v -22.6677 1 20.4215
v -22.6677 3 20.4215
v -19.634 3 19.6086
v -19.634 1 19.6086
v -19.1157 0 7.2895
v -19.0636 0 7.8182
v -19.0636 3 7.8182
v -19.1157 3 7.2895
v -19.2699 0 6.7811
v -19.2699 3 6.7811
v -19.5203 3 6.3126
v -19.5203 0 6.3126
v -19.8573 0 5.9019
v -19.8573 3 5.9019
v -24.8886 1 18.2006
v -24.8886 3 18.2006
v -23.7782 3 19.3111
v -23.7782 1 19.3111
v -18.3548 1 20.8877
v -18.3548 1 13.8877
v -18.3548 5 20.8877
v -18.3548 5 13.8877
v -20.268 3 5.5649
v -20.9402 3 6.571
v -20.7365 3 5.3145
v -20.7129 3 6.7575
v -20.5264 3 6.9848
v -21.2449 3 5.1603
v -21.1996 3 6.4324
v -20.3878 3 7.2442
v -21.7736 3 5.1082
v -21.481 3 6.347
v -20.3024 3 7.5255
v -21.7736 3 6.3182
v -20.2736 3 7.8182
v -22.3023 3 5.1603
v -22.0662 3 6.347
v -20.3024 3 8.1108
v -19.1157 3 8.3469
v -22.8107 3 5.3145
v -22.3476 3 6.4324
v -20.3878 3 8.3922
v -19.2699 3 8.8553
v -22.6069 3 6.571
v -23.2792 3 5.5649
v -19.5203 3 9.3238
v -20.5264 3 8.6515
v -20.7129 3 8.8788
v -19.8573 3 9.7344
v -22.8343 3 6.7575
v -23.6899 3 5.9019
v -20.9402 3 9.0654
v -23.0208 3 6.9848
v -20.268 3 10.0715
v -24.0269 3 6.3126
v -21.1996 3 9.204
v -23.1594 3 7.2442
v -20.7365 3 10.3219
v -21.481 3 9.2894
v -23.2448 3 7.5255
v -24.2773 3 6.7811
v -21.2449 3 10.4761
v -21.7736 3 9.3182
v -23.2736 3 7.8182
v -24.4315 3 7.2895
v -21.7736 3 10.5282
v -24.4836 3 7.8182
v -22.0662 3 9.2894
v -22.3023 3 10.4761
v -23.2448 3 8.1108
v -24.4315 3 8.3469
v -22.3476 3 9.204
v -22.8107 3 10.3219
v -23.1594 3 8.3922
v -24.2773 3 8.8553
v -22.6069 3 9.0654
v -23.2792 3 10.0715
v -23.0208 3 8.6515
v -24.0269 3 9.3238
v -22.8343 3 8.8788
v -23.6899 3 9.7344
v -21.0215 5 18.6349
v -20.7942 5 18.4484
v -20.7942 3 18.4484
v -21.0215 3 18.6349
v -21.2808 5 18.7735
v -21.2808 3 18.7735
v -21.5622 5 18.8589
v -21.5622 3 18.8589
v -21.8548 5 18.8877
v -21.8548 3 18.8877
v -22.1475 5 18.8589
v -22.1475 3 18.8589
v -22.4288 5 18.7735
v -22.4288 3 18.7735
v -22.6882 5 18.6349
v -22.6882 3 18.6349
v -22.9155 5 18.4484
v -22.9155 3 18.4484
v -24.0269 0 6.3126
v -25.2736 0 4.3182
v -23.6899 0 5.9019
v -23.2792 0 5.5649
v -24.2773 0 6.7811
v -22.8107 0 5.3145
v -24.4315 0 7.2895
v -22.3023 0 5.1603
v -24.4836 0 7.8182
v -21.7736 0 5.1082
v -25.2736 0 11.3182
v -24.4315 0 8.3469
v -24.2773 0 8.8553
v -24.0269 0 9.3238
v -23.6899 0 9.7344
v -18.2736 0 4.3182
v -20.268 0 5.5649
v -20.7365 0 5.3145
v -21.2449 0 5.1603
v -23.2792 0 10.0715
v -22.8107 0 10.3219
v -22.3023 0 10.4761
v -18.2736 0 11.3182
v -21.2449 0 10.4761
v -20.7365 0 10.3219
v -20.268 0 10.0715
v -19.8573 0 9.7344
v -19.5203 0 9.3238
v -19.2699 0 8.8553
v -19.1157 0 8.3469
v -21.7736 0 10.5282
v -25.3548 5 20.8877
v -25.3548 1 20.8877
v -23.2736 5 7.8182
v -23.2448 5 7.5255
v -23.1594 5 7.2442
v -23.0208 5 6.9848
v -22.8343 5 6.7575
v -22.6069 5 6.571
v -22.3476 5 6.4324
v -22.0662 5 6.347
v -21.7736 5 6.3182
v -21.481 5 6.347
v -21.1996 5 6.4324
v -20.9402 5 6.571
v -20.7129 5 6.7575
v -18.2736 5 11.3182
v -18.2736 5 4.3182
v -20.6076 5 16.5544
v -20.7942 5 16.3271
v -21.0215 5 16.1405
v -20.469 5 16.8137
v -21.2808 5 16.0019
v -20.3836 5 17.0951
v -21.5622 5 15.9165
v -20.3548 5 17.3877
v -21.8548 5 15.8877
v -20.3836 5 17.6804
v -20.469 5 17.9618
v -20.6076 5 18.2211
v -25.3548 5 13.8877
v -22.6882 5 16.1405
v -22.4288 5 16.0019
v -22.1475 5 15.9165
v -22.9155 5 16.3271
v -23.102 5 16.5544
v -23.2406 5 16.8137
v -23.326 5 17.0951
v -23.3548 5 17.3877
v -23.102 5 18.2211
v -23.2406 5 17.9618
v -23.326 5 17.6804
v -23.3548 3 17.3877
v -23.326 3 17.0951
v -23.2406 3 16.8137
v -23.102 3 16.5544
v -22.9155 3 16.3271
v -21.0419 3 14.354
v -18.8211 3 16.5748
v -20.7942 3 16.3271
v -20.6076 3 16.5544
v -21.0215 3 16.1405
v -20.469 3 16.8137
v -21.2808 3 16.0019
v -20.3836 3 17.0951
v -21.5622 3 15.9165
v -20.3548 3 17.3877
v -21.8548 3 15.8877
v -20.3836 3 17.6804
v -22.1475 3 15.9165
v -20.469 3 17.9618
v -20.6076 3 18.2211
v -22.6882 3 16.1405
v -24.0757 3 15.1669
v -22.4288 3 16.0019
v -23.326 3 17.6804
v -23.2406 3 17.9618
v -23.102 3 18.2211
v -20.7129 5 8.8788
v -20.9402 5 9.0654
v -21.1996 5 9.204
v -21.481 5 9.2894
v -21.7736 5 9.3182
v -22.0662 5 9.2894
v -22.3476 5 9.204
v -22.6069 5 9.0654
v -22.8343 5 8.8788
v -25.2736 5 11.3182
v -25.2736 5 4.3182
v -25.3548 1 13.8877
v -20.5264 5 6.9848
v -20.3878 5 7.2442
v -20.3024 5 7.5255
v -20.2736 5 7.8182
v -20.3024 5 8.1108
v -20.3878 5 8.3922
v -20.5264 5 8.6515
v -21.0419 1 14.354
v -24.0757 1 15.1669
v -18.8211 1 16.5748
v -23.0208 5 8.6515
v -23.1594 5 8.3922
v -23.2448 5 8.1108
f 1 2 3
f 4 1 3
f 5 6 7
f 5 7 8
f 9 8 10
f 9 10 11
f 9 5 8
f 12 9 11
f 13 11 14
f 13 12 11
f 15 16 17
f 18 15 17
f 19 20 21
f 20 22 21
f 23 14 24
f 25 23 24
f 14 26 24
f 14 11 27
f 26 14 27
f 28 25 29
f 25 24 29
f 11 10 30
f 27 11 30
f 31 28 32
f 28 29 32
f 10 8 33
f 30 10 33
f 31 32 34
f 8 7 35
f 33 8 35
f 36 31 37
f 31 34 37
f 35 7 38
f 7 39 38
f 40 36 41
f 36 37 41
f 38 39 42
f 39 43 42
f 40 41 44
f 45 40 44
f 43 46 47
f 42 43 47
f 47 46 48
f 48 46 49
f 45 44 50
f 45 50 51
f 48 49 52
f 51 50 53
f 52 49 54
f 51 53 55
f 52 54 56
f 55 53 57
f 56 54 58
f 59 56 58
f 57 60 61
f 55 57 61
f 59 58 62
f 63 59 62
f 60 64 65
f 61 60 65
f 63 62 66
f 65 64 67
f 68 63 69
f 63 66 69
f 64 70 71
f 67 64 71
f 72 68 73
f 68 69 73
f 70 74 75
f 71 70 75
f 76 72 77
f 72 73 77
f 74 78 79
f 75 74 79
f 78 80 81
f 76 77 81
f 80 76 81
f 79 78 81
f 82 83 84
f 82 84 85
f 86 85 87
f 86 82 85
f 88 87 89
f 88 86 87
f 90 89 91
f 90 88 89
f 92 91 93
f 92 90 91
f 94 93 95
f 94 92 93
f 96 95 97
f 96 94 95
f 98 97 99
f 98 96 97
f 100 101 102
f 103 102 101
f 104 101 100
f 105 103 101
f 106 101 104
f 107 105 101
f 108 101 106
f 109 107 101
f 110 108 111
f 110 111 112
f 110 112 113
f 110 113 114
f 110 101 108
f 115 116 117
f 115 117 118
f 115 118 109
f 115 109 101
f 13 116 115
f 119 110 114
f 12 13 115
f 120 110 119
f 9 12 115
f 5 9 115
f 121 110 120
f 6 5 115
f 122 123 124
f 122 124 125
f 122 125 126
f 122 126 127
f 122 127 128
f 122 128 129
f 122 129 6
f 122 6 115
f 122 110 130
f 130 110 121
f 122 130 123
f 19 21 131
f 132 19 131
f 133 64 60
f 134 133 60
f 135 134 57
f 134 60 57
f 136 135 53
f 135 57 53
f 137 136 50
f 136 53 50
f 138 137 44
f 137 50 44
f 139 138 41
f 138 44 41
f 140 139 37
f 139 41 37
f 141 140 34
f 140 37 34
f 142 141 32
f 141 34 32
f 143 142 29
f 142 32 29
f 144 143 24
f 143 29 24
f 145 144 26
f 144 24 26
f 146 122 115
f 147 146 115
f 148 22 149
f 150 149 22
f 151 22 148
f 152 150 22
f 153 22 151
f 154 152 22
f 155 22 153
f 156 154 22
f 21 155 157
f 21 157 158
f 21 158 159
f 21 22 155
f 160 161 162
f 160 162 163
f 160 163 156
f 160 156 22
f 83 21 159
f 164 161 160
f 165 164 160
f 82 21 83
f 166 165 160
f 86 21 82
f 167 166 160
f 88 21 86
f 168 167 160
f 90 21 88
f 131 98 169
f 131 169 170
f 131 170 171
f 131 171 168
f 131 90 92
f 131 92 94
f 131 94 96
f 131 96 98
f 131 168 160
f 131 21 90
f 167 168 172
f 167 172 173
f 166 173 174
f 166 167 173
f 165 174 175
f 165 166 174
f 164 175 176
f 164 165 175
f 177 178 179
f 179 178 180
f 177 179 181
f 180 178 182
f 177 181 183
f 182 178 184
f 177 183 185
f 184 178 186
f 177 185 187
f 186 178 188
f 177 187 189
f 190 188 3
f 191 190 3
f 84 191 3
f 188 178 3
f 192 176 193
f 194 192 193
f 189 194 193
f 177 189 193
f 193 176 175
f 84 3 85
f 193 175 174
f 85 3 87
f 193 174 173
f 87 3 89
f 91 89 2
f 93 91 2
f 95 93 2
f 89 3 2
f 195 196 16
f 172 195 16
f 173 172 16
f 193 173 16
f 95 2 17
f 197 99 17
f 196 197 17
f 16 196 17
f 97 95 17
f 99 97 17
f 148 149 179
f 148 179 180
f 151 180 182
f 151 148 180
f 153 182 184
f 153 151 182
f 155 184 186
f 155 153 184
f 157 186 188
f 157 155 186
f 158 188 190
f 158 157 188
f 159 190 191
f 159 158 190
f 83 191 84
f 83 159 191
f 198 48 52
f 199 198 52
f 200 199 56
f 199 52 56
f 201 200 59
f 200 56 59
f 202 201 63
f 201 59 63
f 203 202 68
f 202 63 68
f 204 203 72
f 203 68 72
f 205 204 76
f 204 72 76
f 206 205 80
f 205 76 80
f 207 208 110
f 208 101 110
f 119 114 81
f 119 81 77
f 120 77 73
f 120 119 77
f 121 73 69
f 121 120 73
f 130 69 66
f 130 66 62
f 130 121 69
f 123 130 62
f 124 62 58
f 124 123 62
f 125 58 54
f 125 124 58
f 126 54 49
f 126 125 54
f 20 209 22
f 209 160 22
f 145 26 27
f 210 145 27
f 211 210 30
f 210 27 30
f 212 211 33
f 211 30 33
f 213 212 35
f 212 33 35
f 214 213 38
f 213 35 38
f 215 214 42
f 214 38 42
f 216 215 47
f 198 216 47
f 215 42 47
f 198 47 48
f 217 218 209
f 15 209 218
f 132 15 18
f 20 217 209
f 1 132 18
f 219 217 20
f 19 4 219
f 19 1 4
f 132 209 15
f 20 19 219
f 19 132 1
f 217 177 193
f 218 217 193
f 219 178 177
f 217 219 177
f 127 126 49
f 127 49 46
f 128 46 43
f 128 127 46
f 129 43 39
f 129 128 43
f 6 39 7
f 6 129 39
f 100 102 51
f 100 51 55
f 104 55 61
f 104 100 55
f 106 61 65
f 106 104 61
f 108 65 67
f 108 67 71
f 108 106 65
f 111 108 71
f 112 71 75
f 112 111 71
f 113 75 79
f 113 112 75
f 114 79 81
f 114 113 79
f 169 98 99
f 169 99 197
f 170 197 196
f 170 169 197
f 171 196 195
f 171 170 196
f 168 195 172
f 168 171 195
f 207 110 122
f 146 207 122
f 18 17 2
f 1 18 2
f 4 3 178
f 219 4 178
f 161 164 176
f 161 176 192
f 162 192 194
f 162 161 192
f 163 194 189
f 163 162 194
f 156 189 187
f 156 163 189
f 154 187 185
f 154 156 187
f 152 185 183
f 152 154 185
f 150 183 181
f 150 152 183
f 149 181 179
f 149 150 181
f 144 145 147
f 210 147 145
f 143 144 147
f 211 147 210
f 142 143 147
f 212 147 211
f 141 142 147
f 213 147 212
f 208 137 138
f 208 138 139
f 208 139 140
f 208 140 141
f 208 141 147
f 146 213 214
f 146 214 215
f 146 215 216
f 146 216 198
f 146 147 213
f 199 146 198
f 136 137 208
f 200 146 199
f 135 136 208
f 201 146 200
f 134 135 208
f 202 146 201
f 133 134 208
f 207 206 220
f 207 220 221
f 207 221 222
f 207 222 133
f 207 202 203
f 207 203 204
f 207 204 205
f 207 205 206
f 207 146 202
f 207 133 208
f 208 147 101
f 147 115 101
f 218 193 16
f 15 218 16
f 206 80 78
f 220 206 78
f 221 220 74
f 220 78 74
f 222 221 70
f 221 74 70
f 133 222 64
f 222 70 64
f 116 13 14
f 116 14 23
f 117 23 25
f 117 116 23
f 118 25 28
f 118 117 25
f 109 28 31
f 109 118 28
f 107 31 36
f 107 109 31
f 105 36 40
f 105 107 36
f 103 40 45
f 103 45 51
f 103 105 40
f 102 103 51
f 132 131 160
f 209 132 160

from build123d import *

# Parameters (mm, degrees)
F1_DEPTH = 3
F3_DEPTH = 2
F5_DEPTH = 2
F7_DEPTH = 2


with BuildPart() as f1:
    # F0 (on Front) → F1 (new body)
    with BuildSketch(Plane.XZ):
        with BuildLine():
            Line((-18.2735935003, 11.3181839303), (-25.2735935003, 11.3181839303))
            Line((-25.2735935003, 11.3181839303), (-23.6898528773, 9.7344433073))
            ThreePointArc((-23.6898528773, 9.7344433073), (-21.7735935003, 10.5281839303), (-19.8573341232, 9.7344433073))
            Line((-19.8573341232, 9.7344433073), (-18.2735935003, 11.3181839303))
        make_face()
        with BuildLine():
            Line((-23.6898528773, 9.7344433073), (-25.2735935003, 11.3181839303))
            Line((-25.2735935003, 11.3181839303), (-25.2735935003, 4.3181839303))
            Line((-25.2735935003, 4.3181839303), (-23.6898528773, 5.9019245533))
            ThreePointArc((-23.6898528773, 5.9019245533), (-24.4835935003, 7.8181839303), (-23.6898528773, 9.7344433073))
        make_face()
        with BuildLine():
            Line((-23.6898528773, 5.9019245533), (-25.2735935003, 4.3181839303))
            Line((-25.2735935003, 4.3181839303), (-18.2735935003, 4.3181839303))
            Line((-18.2735935003, 4.3181839303), (-19.8573341232, 5.9019245533))
            ThreePointArc((-19.8573341232, 5.9019245533), (-21.7735935003, 5.1081839303), (-23.6898528773, 5.9019245533))
        make_face()
        with BuildLine():
            Line((-18.2735935003, 4.3181839303), (-18.2735935003, 11.3181839303))
            Line((-18.2735935003, 11.3181839303), (-19.8573341232, 9.7344433073))
            ThreePointArc((-19.8573341232, 9.7344433073), (-19.2698799672, 8.855256032), (-19.0635935003, 7.8181839303))
            ThreePointArc((-19.0635935003, 7.8181839303), (-19.2698799672, 6.7811118286), (-19.8573341232, 5.9019245533))
            Line((-19.8573341232, 5.9019245533), (-18.2735935003, 4.3181839303))
        make_face()
    extrude(amount=-F1_DEPTH)

    # F2 (on face) → F3 (join)
    with BuildSketch(Plane(origin=(0, 3, 0), x_dir=(-1, 0, 0), z_dir=(0, 1, 0))):
        with BuildLine():
            Line((19.8573341232, 9.7344433073), (18.2735935003, 11.3181839303))
            Line((18.2735935003, 11.3181839303), (18.2735935003, 4.3181839303))
            Line((18.2735935003, 4.3181839303), (19.8573341232, 5.9019245533))
            ThreePointArc((19.8573341232, 5.9019245533), (19.0635935003, 7.8181839303), (19.8573341232, 9.7344433073))
        make_face()
        with BuildLine():
            Line((20.7129333285, 8.878844102), (19.8573341232, 9.7344433073))
            ThreePointArc((19.8573341232, 9.7344433073), (19.0635935003, 7.8181839303), (19.8573341232, 5.9019245533))
            Line((19.8573341232, 5.9019245533), (20.7129333285, 6.7575237585))
            ThreePointArc((20.7129333285, 6.7575237585), (20.2735935003, 7.8181839303), (20.7129333285, 8.878844102))
        make_face()
        with BuildLine():
            Line((20.7129333285, 6.7575237585), (19.8573341232, 5.9019245533))
            ThreePointArc((19.8573341232, 5.9019245533), (21.7735935003, 5.1081839303), (23.6898528773, 5.9019245533))
            Line((23.6898528773, 5.9019245533), (22.834253672, 6.7575237585))
            ThreePointArc((22.834253672, 6.7575237585), (21.7735935003, 6.3181839303), (20.7129333285, 6.7575237585))
        make_face()
        with BuildLine():
            Line((19.8573341232, 5.9019245533), (18.2735935003, 4.3181839303))
            Line((18.2735935003, 4.3181839303), (25.2735935003, 4.3181839303))
            Line((25.2735935003, 4.3181839303), (23.6898528773, 5.9019245533))
            ThreePointArc((23.6898528773, 5.9019245533), (21.7735935003, 5.1081839303), (19.8573341232, 5.9019245533))
        make_face()
        with BuildLine():
            Line((25.2735935003, 4.3181839303), (25.2735935003, 11.3181839303))
            Line((25.2735935003, 11.3181839303), (23.6898528773, 9.7344433073))
            ThreePointArc((23.6898528773, 9.7344433073), (24.2773070334, 8.855256032), (24.4835935003, 7.8181839303))
            ThreePointArc((24.4835935003, 7.8181839303), (24.2773070334, 6.7811118286), (23.6898528773, 5.9019245533))
            Line((23.6898528773, 5.9019245533), (25.2735935003, 4.3181839303))
        make_face()
        with BuildLine():
            ThreePointArc((24.4835935003, 7.8181839303), (24.2773070334, 8.855256032), (23.6898528773, 9.7344433073))
            Line((23.6898528773, 9.7344433073), (22.834253672, 8.878844102))
            ThreePointArc((22.834253672, 8.878844102), (23.159412799, 8.3922090788), (23.2735935003, 7.8181839303))
            ThreePointArc((23.2735935003, 7.8181839303), (23.159412799, 7.2441587817), (22.834253672, 6.7575237585))
            Line((22.834253672, 6.7575237585), (23.6898528773, 5.9019245533))
            ThreePointArc((23.6898528773, 5.9019245533), (24.2773070334, 6.7811118286), (24.4835935003, 7.8181839303))
        make_face()
        with BuildLine():
            ThreePointArc((23.6898528773, 9.7344433073), (21.7735935003, 10.5281839303), (19.8573341232, 9.7344433073))
            Line((19.8573341232, 9.7344433073), (20.7129333285, 8.878844102))
            ThreePointArc((20.7129333285, 8.878844102), (21.7735935003, 9.3181839303), (22.834253672, 8.878844102))
            Line((22.834253672, 8.878844102), (23.6898528773, 9.7344433073))
        make_face()
        with BuildLine():
            Line((25.2735935003, 11.3181839303), (18.2735935003, 11.3181839303))
            Line((18.2735935003, 11.3181839303), (19.8573341232, 9.7344433073))
            ThreePointArc((19.8573341232, 9.7344433073), (21.7735935003, 10.5281839303), (23.6898528773, 9.7344433073))
            Line((23.6898528773, 9.7344433073), (25.2735935003, 11.3181839303))
        make_face()
    extrude(amount=F3_DEPTH)


with BuildPart() as f5:
    # F4 (on face) → F5 (new body)
    with BuildSketch(Plane(origin=(0, 5, 0), x_dir=(-1, 0, 0), z_dir=(0, 1, 0))):
        with BuildLine():
            Line((18.3548243865, 20.8877273196), (18.3548243865, 13.8877273196))
            Line((18.3548243865, 13.8877273196), (20.7941642148, 16.3270671479))
            ThreePointArc((20.7941642148, 16.3270671479), (20.3548243865, 17.3877273196), (20.7941642148, 18.4483874914))
            Line((20.7941642148, 18.4483874914), (18.3548243865, 20.8877273196))
        make_face()
        with BuildLine():
            Line((18.3548243865, 13.8877273196), (25.3548243865, 13.8877273196))
            Line((25.3548243865, 13.8877273196), (22.9154845583, 16.3270671479))
            ThreePointArc((22.9154845583, 16.3270671479), (21.8548243865, 15.8877273196), (20.7941642148, 16.3270671479))
            Line((20.7941642148, 16.3270671479), (18.3548243865, 13.8877273196))
        make_face()
        with BuildLine():
            Line((22.9154845583, 16.3270671479), (25.3548243865, 13.8877273196))
            Line((25.3548243865, 13.8877273196), (25.3548243865, 20.8877273196))
            Line((25.3548243865, 20.8877273196), (22.9154845583, 18.4483874914))
            ThreePointArc((22.9154845583, 18.4483874914), (23.2406436853, 17.9617524682), (23.3548243865, 17.3877273196))
            ThreePointArc((23.3548243865, 17.3877273196), (23.2406436853, 16.8137021711), (22.9154845583, 16.3270671479))
        make_face()
        with BuildLine():
            Line((22.9154845583, 18.4483874914), (25.3548243865, 20.8877273196))
            Line((25.3548243865, 20.8877273196), (18.3548243865, 20.8877273196))
            Line((18.3548243865, 20.8877273196), (20.7941642148, 18.4483874914))
            ThreePointArc((20.7941642148, 18.4483874914), (21.8548243865, 18.8877273196), (22.9154845583, 18.4483874914))
        make_face()
    extrude(amount=-F5_DEPTH)

    # F6 (on face) → F7 (join)
    with BuildSketch(Plane.XZ.offset(-3)):
        Polygon((-23.7781548314, 19.3110577645), (-25.3548243865, 20.8877273196), (-25.3548243865, 13.8877273196), (-24.0756950867, 15.1668566195), (-24.8885901814, 18.2006224144), align=None)
        Polygon((-24.0756950867, 15.1668566195), (-25.3548243865, 13.8877273196), (-18.3548243865, 13.8877273196), (-19.9314939417, 15.4643968748), (-21.0419292918, 14.3539615247), align=None)
        Polygon((-18.3548243865, 13.8877273196), (-18.3548243865, 20.8877273196), (-19.6339536864, 19.6085980198), (-18.8210585916, 16.5748322249), (-19.9314939417, 15.4643968748), align=None)
        Polygon((-18.3548243865, 20.8877273196), (-25.3548243865, 20.8877273196), (-23.7781548314, 19.3110577645), (-22.6677194813, 20.4214931145), (-19.6339536864, 19.6085980198), align=None)
    extrude(amount=F7_DEPTH)


solid = Compound([f1.part, f5.part])
